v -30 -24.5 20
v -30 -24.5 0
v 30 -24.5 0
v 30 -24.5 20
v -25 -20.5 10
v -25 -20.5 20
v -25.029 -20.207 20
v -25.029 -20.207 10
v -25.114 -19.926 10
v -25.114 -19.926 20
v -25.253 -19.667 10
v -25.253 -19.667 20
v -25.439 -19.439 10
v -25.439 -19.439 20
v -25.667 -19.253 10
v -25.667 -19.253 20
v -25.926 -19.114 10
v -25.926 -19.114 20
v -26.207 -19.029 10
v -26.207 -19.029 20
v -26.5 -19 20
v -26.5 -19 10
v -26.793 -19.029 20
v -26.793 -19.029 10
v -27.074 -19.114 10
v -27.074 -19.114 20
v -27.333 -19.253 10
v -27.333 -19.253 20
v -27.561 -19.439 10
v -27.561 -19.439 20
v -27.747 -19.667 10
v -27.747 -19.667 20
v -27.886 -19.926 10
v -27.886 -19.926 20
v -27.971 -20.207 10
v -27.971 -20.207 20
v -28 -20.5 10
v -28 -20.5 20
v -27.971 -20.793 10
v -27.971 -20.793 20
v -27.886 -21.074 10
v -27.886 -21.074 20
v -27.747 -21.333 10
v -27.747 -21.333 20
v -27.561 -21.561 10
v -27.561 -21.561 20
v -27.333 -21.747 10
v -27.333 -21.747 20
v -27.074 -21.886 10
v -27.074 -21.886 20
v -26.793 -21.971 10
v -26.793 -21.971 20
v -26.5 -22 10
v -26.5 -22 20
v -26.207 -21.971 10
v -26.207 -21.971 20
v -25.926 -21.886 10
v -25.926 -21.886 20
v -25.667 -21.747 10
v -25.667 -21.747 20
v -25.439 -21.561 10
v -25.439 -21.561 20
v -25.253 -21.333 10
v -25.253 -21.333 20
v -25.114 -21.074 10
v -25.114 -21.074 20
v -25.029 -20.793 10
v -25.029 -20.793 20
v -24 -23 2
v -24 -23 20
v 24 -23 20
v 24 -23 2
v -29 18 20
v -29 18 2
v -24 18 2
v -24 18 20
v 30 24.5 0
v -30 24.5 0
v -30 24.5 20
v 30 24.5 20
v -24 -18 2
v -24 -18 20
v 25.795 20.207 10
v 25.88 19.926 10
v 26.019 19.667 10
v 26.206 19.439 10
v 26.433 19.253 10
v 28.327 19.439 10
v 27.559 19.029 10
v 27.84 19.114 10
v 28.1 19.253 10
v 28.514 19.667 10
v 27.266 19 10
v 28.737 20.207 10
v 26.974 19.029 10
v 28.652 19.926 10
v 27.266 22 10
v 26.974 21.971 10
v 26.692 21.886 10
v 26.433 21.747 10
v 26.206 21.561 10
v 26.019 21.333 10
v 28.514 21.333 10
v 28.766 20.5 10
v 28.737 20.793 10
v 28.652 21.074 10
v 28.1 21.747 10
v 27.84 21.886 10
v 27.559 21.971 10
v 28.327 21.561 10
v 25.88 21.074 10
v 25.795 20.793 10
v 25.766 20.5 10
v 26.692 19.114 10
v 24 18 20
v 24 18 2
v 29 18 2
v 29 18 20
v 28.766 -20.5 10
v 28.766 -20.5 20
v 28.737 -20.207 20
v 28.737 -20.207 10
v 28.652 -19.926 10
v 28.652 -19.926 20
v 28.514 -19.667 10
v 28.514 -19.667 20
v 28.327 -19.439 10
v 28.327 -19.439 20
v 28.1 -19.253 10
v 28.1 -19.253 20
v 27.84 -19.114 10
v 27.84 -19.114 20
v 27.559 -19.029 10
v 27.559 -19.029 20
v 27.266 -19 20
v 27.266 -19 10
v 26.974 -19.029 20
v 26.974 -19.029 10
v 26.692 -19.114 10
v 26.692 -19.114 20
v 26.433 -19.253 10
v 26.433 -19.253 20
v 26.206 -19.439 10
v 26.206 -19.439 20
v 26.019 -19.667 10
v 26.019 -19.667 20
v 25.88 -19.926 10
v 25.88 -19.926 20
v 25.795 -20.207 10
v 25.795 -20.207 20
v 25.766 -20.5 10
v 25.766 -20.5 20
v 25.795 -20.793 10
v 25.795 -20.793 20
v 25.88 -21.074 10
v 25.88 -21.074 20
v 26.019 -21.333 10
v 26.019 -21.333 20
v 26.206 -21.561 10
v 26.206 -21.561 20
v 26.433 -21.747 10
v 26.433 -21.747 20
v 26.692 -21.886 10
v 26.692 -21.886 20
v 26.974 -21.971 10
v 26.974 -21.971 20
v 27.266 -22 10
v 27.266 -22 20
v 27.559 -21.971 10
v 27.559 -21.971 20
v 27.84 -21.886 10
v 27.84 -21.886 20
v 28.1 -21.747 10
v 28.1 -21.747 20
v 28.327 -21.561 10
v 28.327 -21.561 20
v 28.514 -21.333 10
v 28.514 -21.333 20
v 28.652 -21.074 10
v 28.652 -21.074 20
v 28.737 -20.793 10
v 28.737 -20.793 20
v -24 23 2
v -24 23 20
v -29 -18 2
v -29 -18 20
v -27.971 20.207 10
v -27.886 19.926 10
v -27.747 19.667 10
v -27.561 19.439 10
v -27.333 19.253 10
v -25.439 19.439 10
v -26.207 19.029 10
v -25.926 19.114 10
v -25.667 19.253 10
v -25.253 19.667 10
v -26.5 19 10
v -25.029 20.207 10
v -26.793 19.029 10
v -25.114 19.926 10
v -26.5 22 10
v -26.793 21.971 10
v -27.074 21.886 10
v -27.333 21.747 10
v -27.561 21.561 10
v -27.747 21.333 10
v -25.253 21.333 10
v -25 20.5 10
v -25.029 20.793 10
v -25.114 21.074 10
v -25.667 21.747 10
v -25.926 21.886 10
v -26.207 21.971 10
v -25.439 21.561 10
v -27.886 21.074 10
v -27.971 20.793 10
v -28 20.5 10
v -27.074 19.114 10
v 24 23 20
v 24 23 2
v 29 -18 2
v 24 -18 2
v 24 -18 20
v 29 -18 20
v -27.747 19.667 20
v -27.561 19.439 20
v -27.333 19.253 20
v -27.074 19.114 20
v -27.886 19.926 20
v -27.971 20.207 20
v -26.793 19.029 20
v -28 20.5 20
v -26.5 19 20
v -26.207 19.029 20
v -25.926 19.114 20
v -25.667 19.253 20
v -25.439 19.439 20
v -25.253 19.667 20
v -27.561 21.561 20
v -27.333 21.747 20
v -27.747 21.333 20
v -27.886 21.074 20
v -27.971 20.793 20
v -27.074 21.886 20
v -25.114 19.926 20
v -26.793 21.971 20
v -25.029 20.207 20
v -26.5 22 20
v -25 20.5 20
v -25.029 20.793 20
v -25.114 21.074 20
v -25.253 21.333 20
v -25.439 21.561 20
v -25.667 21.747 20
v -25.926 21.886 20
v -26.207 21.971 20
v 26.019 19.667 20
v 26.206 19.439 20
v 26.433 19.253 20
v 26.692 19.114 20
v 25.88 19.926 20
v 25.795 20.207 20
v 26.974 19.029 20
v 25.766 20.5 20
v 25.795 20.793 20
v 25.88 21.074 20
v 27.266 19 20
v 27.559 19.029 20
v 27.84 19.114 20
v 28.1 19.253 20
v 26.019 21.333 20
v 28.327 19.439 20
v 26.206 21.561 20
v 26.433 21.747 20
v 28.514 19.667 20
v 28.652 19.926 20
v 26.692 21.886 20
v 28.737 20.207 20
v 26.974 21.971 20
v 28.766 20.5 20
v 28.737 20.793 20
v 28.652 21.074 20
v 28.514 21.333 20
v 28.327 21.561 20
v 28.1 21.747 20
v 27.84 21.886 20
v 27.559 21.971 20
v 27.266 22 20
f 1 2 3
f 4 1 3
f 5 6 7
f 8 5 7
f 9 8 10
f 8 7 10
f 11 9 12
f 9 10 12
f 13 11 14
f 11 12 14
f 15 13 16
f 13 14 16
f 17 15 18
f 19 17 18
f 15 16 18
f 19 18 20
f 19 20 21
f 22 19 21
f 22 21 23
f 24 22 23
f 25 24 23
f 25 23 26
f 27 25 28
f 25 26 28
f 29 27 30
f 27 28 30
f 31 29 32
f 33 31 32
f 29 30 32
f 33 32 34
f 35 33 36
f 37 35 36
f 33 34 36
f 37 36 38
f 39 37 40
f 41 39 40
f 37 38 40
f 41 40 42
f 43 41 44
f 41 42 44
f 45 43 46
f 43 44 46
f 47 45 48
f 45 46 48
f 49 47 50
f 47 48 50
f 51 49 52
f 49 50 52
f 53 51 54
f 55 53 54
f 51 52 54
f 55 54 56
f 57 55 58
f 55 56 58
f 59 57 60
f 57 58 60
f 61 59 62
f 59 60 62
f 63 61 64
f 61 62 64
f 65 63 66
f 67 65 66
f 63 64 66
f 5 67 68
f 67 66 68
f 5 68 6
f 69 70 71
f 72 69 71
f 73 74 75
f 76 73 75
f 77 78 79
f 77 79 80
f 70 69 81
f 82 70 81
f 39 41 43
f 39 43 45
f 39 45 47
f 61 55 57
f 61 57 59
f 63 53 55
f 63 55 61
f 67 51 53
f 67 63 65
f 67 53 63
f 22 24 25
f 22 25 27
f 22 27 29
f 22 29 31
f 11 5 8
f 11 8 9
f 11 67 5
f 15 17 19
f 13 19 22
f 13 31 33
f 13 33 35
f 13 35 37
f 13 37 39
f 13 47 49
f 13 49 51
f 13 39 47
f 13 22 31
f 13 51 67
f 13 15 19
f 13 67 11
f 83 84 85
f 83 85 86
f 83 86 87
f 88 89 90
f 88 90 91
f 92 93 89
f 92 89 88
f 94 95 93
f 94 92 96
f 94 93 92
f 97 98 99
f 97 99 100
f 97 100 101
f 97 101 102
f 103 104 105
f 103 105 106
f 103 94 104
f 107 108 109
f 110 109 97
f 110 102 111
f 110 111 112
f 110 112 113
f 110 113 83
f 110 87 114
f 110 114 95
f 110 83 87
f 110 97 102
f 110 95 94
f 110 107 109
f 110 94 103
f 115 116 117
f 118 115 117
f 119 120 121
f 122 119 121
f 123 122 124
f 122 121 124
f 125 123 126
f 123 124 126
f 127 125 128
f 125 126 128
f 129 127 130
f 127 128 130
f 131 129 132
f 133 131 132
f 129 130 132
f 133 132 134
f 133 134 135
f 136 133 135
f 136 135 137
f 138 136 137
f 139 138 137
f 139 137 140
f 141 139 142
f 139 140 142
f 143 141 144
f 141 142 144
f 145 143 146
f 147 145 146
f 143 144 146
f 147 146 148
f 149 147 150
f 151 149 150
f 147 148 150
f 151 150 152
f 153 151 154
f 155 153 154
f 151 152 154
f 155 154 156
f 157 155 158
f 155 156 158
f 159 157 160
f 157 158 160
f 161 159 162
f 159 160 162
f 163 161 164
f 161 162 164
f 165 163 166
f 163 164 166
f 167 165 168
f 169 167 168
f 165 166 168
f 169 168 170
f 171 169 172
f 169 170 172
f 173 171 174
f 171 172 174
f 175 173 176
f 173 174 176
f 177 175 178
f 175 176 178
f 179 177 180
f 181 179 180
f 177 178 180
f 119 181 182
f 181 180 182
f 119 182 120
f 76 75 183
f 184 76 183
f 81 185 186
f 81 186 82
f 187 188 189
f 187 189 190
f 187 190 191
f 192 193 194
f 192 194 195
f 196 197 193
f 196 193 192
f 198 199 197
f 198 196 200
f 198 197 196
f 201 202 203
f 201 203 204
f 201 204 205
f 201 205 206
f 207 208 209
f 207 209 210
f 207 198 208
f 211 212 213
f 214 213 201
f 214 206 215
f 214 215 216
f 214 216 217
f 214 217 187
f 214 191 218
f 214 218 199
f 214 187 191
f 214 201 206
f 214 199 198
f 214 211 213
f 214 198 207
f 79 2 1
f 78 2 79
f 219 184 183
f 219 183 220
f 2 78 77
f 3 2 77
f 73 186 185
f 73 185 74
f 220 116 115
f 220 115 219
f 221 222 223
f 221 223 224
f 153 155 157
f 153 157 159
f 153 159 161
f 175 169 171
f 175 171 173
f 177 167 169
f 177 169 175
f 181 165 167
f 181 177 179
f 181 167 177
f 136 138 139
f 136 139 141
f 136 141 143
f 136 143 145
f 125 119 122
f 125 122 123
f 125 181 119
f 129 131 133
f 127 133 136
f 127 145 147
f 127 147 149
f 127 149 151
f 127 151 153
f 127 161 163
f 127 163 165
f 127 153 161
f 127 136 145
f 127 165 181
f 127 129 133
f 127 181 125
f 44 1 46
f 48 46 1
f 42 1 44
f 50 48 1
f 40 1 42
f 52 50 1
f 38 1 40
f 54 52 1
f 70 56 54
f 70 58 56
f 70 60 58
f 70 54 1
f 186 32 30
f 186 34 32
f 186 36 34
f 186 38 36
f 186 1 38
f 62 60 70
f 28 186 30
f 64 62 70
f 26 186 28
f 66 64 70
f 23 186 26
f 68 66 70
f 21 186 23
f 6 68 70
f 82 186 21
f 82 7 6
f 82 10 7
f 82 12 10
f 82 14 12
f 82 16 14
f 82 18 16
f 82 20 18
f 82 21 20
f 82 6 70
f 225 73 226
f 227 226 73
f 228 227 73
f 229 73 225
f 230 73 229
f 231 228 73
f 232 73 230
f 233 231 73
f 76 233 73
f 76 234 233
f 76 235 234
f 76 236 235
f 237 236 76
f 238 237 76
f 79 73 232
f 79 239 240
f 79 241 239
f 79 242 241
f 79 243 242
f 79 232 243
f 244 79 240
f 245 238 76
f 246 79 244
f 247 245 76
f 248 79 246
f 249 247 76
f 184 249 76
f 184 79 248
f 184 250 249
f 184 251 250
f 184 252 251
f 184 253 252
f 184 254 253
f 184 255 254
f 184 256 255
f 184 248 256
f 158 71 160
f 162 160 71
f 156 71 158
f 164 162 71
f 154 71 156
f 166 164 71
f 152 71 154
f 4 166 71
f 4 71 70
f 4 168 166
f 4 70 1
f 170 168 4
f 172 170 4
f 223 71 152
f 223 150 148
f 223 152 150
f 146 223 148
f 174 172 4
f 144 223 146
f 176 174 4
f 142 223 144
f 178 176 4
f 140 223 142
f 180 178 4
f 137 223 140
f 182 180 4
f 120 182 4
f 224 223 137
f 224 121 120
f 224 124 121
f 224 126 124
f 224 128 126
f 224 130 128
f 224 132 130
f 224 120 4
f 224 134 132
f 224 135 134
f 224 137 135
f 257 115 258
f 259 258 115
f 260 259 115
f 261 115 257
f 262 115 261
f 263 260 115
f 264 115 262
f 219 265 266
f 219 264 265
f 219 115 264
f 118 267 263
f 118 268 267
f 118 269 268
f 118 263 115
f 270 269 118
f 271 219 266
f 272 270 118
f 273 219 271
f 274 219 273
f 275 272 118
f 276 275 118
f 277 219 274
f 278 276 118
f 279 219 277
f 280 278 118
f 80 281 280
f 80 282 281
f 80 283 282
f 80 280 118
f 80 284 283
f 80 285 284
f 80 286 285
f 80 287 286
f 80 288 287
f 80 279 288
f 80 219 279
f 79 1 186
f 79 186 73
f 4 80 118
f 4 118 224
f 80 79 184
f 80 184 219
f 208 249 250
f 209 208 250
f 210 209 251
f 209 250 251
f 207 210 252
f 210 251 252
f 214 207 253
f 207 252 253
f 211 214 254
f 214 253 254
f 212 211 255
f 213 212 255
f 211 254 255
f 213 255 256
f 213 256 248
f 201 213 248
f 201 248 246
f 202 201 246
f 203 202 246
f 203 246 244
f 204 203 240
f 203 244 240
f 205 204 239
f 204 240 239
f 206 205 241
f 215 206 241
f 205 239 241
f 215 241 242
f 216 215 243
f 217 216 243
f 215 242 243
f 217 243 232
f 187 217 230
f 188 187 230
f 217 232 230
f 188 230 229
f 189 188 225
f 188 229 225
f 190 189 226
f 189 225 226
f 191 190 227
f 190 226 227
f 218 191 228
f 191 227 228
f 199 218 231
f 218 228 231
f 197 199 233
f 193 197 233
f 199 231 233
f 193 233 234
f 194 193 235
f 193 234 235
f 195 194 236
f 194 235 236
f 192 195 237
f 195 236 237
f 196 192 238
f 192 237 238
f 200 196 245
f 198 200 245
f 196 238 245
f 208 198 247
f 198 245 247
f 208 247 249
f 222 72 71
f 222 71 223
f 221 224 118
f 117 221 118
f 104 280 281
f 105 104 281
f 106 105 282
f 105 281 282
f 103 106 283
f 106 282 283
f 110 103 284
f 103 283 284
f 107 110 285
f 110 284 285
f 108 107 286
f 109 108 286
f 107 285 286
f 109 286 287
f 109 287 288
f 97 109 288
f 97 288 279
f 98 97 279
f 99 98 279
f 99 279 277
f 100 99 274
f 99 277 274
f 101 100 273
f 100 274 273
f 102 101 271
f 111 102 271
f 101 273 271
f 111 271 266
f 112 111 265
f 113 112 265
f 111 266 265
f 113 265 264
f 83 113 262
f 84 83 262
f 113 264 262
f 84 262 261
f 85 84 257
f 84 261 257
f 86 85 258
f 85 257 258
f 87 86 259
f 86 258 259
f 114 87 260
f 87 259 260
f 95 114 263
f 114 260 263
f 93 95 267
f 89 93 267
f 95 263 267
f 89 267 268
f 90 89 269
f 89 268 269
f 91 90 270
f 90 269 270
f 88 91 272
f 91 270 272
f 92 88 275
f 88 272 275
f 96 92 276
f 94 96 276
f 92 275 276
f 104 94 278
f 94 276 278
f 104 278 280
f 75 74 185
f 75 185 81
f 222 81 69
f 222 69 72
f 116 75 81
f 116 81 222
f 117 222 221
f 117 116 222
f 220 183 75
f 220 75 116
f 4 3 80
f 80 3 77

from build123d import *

# Parameters (mm, degrees)
F0_W     = 60
F0_H     = 49
F1_DEPTH = 20
F2_W     = 58
F2_H     = 46
F3_DEPTH = 18
F4_W     = 5
F4_H     = 5
F5_DEPTH = 18
F6_R     = 1.5
F7_DEPTH = 10


with BuildPart() as f1:
    # F0 (on Top) → F1 (new body)
    with BuildSketch(Plane.XY):
        Rectangle(F0_W, F0_H)
    extrude(amount=F1_DEPTH)

    # F2 (on face) → F3 (cut)
    with BuildSketch(Plane.XY.offset(20)):
        Rectangle(F2_W, F2_H)
    extrude(amount=-F3_DEPTH, mode=Mode.SUBTRACT)

    # F4 (on face) → F5 (join)
    with BuildSketch(Plane.XY.offset(2)):
        with Locations((-26.5, -20.5)):
            Rectangle(F4_W, F4_H)
        with Locations((26.5, -20.5)):
            Rectangle(F4_W, F4_H)
        with Locations((-26.5, 20.5)):
            Rectangle(F4_W, F4_H)
        with Locations((26.5, 20.5)):
            Rectangle(F4_W, F4_H)
    extrude(amount=F5_DEPTH)

    # F6 (on face) → F7 (cut)
    with BuildSketch(Plane.XY.offset(20)):
        with Locations((-26.5, -20.5)):
            Circle(F6_R)
        with Locations((-26.5, 20.5)):
            Circle(F6_R)
        with Locations((27.266302, 20.5)):
            Circle(F6_R)
        with Locations((27.266302, -20.5)):
            Circle(F6_R)
    extrude(amount=-F7_DEPTH, mode=Mode.SUBTRACT)


solid = f1.part
